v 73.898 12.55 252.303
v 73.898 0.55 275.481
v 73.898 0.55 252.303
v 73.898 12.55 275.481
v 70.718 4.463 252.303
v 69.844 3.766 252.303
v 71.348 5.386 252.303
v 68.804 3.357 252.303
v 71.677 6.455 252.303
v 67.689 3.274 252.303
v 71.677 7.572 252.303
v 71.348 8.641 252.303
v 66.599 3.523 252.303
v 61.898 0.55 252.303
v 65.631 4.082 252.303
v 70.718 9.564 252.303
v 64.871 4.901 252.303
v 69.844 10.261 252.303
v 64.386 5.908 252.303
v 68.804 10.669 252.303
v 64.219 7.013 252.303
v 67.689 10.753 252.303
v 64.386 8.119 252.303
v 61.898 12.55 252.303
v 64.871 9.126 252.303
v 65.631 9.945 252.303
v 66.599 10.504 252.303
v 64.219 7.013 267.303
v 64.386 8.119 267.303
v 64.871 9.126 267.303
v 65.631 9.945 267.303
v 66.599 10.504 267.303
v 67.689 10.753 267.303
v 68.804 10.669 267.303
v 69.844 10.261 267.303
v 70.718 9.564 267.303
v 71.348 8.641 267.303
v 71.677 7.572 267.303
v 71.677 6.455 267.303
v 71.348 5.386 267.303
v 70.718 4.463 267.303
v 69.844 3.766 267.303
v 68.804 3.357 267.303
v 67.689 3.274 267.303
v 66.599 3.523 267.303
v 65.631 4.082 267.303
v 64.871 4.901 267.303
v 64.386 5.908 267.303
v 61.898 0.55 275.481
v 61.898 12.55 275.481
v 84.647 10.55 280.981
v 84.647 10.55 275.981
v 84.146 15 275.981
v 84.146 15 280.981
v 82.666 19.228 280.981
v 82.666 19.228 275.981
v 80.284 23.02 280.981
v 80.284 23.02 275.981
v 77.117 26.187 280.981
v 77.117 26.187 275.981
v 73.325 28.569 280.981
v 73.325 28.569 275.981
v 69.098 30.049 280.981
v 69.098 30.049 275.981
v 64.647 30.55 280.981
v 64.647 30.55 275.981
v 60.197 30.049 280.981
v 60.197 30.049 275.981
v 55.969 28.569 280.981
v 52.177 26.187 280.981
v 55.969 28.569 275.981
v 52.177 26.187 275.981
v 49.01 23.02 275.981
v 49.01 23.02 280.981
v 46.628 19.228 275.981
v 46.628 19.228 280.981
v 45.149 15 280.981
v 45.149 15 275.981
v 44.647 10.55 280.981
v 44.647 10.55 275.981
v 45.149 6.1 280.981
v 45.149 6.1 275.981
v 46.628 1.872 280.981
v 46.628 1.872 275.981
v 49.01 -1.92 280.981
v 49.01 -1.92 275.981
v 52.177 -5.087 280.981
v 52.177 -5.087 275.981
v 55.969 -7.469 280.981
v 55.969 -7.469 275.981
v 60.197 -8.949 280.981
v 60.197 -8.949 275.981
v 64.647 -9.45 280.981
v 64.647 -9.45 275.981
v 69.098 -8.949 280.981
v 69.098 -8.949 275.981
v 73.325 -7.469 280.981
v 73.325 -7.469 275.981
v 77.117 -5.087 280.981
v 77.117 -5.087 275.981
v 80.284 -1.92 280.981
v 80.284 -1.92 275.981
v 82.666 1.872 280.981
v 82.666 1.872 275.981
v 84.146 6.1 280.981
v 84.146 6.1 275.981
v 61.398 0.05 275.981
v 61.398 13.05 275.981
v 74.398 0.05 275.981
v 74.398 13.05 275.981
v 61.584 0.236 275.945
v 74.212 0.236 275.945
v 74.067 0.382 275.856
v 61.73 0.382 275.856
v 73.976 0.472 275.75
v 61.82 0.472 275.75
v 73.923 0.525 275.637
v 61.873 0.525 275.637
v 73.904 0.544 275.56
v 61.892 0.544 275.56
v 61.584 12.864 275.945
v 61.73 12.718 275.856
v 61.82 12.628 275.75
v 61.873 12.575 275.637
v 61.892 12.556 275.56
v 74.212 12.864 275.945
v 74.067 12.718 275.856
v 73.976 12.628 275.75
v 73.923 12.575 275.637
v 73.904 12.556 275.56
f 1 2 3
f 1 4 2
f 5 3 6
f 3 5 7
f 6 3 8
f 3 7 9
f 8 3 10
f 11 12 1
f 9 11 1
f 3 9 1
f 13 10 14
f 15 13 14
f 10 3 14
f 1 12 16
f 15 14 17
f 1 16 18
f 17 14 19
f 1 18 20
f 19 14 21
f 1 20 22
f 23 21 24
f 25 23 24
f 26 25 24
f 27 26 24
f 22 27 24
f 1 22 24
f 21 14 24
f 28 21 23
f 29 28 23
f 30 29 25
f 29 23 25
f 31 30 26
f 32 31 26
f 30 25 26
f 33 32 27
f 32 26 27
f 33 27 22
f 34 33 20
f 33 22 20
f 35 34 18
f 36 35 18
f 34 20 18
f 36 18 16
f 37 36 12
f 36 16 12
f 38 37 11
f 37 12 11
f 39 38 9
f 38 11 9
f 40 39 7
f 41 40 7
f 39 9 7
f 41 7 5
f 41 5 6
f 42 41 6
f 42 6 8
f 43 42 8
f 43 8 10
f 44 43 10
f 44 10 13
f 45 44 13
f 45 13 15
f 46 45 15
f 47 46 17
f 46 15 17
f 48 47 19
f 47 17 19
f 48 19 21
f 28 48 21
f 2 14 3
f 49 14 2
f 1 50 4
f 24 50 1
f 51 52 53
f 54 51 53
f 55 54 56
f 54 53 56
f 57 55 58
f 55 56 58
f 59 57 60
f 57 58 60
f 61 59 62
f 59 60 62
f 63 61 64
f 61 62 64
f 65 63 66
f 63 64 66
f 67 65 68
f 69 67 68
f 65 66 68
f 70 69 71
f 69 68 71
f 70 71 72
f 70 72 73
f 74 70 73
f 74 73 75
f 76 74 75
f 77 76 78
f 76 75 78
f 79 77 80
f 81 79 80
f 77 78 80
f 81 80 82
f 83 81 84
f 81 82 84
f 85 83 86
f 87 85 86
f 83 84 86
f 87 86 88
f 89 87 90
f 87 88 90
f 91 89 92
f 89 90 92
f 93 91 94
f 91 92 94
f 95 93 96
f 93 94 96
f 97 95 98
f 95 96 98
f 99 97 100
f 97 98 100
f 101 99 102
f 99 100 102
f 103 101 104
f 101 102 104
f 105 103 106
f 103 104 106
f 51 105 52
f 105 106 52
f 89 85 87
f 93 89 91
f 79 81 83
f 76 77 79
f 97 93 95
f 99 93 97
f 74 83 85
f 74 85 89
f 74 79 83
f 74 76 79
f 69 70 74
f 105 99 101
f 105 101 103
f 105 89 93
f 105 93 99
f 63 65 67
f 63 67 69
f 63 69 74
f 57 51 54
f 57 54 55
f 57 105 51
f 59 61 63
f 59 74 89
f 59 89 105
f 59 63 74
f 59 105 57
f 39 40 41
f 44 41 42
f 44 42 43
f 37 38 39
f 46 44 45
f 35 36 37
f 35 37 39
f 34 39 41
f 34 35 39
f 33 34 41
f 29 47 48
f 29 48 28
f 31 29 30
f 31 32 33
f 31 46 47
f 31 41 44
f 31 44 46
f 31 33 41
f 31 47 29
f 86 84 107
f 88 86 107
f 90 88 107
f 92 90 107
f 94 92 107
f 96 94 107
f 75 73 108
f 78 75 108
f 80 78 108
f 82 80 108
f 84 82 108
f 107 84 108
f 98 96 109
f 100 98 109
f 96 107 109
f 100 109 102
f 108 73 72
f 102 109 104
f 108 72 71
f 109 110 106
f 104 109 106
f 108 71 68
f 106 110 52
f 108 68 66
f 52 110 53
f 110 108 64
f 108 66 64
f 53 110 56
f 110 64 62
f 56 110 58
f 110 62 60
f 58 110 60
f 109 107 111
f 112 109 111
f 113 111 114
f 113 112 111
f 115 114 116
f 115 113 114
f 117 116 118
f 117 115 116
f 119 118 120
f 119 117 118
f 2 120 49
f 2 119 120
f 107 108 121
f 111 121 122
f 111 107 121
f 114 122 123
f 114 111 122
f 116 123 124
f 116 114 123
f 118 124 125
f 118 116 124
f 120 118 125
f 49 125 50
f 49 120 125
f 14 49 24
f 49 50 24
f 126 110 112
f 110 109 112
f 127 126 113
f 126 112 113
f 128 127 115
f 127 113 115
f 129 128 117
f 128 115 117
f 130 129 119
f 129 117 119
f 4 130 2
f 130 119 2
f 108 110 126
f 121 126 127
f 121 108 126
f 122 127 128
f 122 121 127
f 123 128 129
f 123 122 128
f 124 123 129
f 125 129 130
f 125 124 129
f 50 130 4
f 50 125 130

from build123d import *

# Parameters (mm, degrees)
BOSS_EXTRUDE1_DEPTH      = 5
BOSS_EXTRUDE1_DEPTH_BACK = 7
SKETCH3_R                = 20
BOSS_EXTRUDE2_DEPTH      = 5
FILLET1_R                = 0.5
SKETCH6_R                = 3.75
CUT_EXTRUDE1_DEPTH       = 15


with BuildPart() as part:
    # Sketch1 → Boss-Extrude1 (new body, two sides)
    with BuildSketch(Plane.ZY.offset(-66.898173267)) as boss_extrude1_sk:
        Polygon((275.981331654, 12.55), (275.981331654, 0.55), (254.516262845, 0.55), (252.302759373, 0.55), (252.302759373, 12.55), (254.516262845, 12.55), align=None)
    extrude(amount=BOSS_EXTRUDE1_DEPTH)
    extrude(boss_extrude1_sk.sketch, amount=-BOSS_EXTRUDE1_DEPTH_BACK)

    # Sketch3 → Boss-Extrude2 (add)
    with BuildSketch(Plane.XY.offset(275.981331654)):
        with Locations((64.647096069, 10.55)):
            Circle(SKETCH3_R)
    extrude(amount=BOSS_EXTRUDE2_DEPTH)

    # Fillet1
    fillet1_edges = [part.edges().sort_by_distance(p)[0] for p in [
        (67.898173267, 12.55, 275.981331654),
        (67.898173267, 0.55, 275.981331654),
        (73.898173267, 6.55, 275.981331654),
        (61.898173267, 6.55, 275.981331654),
    ]]
    fillet(fillet1_edges, radius=FILLET1_R)

    # Sketch6 → Cut-Extrude1 (cut)
    with BuildSketch(Plane(origin=(0, 0, 252.302759373), x_dir=(-1, 0, 0), z_dir=(0, 0, -1))):
        with Locations((-67.969208633, 7.013446821)):
            Circle(SKETCH6_R)
    extrude(amount=-CUT_EXTRUDE1_DEPTH, mode=Mode.SUBTRACT)


solid = part.part
